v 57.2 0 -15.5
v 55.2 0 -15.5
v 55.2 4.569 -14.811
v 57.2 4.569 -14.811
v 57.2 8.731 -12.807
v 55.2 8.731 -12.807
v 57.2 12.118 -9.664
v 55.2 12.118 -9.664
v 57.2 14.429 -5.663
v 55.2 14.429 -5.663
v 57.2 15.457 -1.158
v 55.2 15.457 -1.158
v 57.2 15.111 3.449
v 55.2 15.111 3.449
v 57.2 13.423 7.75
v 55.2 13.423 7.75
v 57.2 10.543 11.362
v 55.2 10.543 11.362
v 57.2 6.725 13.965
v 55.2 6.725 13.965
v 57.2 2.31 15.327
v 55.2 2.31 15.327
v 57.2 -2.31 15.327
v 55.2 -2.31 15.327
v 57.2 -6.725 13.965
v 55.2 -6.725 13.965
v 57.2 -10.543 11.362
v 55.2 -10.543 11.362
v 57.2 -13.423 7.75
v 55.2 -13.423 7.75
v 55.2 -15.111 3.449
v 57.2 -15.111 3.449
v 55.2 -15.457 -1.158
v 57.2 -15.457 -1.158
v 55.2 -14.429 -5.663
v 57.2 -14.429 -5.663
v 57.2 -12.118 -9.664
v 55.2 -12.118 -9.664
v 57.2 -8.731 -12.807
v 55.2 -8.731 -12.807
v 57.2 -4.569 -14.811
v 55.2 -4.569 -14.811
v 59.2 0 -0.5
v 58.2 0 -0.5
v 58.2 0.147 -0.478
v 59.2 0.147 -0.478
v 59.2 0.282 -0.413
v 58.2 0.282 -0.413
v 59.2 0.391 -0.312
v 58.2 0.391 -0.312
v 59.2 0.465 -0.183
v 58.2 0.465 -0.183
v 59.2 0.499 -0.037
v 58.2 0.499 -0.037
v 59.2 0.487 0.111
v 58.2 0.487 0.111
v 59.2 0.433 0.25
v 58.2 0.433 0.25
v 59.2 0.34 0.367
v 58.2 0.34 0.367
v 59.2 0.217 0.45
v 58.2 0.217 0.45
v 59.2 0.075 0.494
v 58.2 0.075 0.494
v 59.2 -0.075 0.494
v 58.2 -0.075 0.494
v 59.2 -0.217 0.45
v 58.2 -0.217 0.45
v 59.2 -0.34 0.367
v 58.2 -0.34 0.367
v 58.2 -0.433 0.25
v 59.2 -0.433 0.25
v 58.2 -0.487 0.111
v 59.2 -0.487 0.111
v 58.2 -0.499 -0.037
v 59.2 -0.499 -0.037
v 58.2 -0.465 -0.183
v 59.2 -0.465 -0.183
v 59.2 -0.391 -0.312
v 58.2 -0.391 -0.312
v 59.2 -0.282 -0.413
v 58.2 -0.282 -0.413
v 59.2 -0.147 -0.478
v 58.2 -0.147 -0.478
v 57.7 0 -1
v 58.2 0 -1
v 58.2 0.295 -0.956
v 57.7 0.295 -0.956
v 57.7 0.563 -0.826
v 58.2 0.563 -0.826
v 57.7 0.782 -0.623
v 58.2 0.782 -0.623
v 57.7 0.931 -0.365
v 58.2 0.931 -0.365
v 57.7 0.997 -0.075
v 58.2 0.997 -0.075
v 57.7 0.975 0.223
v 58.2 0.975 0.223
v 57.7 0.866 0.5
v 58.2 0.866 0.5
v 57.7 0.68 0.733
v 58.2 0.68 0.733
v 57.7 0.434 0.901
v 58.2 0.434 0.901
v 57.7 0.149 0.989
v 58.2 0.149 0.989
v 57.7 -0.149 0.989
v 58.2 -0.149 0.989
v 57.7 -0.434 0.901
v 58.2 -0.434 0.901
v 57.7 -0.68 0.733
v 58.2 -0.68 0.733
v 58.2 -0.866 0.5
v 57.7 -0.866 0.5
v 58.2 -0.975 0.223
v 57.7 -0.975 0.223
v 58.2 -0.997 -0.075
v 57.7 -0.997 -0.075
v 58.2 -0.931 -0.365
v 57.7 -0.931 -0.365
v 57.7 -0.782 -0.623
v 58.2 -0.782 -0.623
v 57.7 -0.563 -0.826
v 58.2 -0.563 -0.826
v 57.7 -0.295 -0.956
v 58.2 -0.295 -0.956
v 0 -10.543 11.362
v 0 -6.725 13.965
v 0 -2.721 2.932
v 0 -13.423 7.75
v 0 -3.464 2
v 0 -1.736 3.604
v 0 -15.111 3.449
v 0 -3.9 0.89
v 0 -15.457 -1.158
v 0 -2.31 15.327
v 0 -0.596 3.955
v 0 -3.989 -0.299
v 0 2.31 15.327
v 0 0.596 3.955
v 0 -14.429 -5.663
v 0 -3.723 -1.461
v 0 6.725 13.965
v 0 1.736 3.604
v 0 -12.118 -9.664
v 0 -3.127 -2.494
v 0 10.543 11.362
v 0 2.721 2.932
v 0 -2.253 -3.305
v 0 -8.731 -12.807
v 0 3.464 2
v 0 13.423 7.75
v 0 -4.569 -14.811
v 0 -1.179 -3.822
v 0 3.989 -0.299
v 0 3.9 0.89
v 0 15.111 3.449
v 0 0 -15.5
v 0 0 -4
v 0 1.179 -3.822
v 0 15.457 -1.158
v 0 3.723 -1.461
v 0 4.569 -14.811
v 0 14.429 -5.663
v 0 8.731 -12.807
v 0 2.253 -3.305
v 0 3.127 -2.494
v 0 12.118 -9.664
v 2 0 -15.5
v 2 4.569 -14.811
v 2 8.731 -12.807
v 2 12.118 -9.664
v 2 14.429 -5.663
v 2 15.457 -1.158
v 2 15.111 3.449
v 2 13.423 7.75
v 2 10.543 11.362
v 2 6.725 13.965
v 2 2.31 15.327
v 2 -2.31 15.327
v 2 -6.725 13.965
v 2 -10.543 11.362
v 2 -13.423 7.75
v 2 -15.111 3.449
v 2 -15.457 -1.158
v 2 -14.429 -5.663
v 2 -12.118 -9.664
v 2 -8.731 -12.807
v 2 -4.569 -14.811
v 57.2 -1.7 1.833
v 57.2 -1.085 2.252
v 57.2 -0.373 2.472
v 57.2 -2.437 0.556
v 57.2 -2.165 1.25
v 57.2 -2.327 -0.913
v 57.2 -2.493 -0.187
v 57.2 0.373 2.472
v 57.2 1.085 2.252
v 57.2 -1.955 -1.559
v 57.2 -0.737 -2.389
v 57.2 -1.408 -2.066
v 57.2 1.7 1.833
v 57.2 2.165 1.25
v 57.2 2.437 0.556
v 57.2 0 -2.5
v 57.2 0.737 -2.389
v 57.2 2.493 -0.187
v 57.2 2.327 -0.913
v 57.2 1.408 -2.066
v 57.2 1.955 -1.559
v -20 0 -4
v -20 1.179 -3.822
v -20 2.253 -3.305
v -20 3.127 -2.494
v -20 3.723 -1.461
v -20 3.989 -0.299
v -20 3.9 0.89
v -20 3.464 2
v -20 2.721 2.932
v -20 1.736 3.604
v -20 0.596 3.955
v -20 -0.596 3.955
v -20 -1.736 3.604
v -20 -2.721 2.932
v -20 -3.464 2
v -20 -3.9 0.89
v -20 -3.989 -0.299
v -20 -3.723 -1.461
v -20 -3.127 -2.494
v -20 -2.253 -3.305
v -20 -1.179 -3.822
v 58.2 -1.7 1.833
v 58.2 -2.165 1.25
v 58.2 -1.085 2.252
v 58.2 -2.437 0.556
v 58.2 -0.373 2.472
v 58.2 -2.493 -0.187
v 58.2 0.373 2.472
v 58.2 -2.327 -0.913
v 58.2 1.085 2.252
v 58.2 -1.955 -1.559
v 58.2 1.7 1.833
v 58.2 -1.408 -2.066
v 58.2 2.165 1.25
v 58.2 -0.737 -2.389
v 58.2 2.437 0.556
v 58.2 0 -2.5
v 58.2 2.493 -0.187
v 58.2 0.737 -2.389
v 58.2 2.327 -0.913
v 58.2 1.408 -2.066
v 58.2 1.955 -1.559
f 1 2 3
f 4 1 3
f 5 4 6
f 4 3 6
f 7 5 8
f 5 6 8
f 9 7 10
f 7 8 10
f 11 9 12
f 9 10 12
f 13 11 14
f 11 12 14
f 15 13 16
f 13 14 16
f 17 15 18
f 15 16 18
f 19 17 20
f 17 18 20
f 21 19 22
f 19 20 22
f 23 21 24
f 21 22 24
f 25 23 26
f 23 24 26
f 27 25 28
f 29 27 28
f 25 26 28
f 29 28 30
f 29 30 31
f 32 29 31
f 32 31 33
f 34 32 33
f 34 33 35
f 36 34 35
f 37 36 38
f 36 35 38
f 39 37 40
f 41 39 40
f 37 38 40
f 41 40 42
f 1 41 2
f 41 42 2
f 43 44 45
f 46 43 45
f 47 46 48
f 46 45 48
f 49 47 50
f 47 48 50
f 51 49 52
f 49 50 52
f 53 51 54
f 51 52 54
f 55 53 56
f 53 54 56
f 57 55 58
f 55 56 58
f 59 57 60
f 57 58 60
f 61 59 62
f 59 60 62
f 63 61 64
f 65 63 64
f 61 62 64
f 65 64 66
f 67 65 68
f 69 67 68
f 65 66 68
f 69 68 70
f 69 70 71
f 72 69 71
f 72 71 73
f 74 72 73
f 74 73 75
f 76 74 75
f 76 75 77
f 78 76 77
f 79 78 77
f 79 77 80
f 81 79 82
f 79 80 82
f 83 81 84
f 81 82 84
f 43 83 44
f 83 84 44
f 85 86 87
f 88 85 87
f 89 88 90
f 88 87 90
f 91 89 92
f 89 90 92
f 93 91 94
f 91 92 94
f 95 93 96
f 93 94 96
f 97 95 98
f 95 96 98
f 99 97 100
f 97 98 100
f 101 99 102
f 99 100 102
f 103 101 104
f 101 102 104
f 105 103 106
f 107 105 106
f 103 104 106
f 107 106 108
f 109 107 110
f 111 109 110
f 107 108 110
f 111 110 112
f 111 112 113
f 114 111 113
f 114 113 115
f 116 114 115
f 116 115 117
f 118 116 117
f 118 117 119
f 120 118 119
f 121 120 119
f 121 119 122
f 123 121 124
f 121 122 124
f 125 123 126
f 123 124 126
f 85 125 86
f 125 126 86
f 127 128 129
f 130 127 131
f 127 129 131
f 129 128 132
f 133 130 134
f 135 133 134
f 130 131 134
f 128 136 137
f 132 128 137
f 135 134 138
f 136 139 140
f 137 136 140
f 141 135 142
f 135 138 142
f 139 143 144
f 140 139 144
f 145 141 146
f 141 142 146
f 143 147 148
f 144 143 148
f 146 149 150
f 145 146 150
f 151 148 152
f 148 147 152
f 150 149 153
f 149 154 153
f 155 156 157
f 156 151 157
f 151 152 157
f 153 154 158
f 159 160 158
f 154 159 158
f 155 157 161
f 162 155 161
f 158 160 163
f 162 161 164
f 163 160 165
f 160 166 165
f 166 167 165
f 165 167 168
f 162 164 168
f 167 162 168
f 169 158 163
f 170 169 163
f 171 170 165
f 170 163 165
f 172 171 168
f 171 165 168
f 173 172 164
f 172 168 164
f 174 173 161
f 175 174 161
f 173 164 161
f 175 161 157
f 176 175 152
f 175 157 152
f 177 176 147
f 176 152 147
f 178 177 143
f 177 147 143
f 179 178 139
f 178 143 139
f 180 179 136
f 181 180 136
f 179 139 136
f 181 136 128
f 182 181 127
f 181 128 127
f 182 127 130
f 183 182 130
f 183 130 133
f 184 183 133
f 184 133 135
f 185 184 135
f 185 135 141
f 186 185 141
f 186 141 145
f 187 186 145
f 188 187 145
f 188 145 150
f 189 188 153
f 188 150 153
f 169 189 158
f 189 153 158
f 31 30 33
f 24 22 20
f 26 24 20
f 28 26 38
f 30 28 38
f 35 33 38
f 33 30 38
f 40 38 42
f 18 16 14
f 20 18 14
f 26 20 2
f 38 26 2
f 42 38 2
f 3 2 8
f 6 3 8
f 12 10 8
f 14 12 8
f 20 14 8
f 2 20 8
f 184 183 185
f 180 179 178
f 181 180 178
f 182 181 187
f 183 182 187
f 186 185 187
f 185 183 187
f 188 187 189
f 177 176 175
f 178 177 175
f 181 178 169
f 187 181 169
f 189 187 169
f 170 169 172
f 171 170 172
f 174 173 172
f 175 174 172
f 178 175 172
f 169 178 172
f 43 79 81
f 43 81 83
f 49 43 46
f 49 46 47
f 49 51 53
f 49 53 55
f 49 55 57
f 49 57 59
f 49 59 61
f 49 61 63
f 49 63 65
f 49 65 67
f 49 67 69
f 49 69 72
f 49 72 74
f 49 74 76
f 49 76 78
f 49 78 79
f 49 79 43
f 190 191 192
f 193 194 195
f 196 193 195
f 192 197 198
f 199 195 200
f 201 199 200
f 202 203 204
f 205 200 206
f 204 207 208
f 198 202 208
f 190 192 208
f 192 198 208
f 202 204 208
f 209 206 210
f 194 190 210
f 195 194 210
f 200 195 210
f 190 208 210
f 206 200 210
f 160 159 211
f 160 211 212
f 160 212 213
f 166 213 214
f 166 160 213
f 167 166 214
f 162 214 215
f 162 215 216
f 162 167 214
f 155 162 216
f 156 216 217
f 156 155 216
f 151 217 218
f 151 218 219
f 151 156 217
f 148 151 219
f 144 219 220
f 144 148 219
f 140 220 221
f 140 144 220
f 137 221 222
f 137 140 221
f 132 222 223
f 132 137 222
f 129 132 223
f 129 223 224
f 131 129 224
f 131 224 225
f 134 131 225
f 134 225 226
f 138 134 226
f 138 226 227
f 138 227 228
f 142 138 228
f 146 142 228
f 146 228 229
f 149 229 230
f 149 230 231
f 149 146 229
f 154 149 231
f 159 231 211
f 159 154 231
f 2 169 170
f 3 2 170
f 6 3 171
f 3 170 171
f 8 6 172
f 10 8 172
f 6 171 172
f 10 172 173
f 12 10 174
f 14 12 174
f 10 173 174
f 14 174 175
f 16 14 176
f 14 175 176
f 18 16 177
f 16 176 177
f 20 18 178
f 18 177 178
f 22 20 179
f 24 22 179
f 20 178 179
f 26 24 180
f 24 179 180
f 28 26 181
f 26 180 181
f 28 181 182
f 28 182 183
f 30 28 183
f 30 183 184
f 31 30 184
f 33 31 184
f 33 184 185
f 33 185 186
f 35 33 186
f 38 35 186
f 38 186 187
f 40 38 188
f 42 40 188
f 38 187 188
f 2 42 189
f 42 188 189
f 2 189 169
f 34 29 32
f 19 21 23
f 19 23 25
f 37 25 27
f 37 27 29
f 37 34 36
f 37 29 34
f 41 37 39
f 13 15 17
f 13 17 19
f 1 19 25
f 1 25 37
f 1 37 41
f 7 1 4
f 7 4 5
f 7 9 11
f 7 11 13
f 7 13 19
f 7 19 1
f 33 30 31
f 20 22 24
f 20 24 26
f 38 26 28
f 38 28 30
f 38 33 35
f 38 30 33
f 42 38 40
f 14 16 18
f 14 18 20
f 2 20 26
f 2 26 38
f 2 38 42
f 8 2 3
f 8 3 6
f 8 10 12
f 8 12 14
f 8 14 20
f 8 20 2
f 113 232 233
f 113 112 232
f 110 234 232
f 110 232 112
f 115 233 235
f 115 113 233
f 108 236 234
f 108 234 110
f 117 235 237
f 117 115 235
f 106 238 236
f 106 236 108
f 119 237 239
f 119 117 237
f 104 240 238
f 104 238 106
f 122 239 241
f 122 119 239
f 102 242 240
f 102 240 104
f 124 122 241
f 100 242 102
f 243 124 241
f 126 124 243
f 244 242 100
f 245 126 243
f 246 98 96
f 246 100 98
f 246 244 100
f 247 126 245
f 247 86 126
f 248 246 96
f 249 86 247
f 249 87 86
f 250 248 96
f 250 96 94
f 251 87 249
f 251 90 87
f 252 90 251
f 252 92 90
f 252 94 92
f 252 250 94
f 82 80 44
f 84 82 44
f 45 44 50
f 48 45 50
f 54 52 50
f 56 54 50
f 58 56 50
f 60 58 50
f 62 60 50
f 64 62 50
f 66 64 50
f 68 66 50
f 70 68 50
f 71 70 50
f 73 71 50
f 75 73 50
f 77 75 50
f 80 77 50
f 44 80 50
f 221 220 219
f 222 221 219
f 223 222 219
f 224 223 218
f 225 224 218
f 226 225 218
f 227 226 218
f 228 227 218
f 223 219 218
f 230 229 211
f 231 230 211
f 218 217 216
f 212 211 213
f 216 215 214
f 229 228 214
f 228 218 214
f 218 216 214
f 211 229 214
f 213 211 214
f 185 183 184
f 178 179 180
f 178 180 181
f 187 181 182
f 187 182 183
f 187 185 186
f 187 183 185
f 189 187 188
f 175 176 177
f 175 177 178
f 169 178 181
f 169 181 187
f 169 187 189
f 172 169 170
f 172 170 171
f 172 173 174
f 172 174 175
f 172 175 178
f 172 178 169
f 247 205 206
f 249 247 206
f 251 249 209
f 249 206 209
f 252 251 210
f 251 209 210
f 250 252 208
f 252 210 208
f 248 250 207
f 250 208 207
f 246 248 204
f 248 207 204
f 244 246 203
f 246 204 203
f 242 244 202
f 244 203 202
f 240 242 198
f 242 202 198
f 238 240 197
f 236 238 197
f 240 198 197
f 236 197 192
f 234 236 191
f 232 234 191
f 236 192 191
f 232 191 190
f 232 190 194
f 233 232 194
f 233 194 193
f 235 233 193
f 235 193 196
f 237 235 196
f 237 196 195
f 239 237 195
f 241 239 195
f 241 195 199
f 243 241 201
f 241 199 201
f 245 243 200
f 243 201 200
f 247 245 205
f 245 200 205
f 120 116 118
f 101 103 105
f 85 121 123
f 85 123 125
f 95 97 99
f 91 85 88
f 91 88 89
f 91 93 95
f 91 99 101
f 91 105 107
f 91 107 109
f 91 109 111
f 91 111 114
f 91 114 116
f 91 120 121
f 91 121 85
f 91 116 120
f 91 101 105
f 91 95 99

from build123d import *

# Parameters (mm, degrees)
CROQUIS2_R              = 15.5
SALIENTE_EXTRUIR1_DEPTH = 2
CROQUIS3_R              = 15.5
SALIENTE_EXTRUIR2_DEPTH = 53.2
CROQUIS4_R              = 15.5
SALIENTE_EXTRUIR3_DEPTH = 2
CROQUIS5_R              = 2.5
SALIENTE_EXTRUIR4_DEPTH = 1
CROQUIS6_R              = 0.5
SALIENTE_EXTRUIR5_DEPTH = 1
CROQUIS8_R              = 4
SALIENTE_EXTRUIR6_DEPTH = 20
CROQUIS9_R              = 1
CORTAR_EXTRUIR4_DEPTH   = 0.5


with BuildPart() as part:
    # Croquis2 → Saliente-Extruir1 (new body)
    with BuildSketch(Plane(origin=(0, 0, 0), x_dir=(0, 0, -1), z_dir=(1, 0, 0))):
        Circle(CROQUIS2_R)
    extrude(amount=SALIENTE_EXTRUIR1_DEPTH)

    # Croquis8 → Saliente-Extruir6 (add)
    with BuildSketch(Plane(origin=(0, 0, 0), x_dir=(0, 0, -1), z_dir=(1, 0, 0))):
        Circle(CROQUIS8_R)
    extrude(amount=-SALIENTE_EXTRUIR6_DEPTH)


with BuildPart() as body_2:
    # Croquis3 → Saliente-Extruir2 (new body)
    with BuildSketch(Plane(origin=(2, 0, 0), x_dir=(0, 0, -1), z_dir=(1, 0, 0))):
        Circle(CROQUIS3_R)
    extrude(amount=SALIENTE_EXTRUIR2_DEPTH)


with BuildPart() as body_3:
    # Croquis4 → Saliente-Extruir3 (new body)
    with BuildSketch(Plane(origin=(55.2, 0, 0), x_dir=(0, 0, -1), z_dir=(1, 0, 0))):
        Circle(CROQUIS4_R)
    extrude(amount=SALIENTE_EXTRUIR3_DEPTH)


with BuildPart() as body_4:
    # Croquis5 → Saliente-Extruir4 (new body)
    with BuildSketch(Plane(origin=(57.2, 0, 0), x_dir=(0, 0, -1), z_dir=(1, 0, 0))):
        Circle(CROQUIS5_R)
    extrude(amount=SALIENTE_EXTRUIR4_DEPTH)

    # Croquis9 → Cortar-Extruir4 (cut)
    with BuildSketch(Plane(origin=(58.2, 0, 0), x_dir=(0, 0, -1), z_dir=(1, 0, 0))):
        Circle(CROQUIS9_R)
    extrude(amount=-CORTAR_EXTRUIR4_DEPTH, mode=Mode.SUBTRACT)


with BuildPart() as body_5:
    # Croquis6 → Saliente-Extruir5 (new body)
    with BuildSketch(Plane(origin=(58.2, 0, 0), x_dir=(0, 0, -1), z_dir=(1, 0, 0))):
        Circle(CROQUIS6_R)
    extrude(amount=SALIENTE_EXTRUIR5_DEPTH)


solid = Compound([part.part, body_2.part, body_3.part, body_4.part, body_5.part])
